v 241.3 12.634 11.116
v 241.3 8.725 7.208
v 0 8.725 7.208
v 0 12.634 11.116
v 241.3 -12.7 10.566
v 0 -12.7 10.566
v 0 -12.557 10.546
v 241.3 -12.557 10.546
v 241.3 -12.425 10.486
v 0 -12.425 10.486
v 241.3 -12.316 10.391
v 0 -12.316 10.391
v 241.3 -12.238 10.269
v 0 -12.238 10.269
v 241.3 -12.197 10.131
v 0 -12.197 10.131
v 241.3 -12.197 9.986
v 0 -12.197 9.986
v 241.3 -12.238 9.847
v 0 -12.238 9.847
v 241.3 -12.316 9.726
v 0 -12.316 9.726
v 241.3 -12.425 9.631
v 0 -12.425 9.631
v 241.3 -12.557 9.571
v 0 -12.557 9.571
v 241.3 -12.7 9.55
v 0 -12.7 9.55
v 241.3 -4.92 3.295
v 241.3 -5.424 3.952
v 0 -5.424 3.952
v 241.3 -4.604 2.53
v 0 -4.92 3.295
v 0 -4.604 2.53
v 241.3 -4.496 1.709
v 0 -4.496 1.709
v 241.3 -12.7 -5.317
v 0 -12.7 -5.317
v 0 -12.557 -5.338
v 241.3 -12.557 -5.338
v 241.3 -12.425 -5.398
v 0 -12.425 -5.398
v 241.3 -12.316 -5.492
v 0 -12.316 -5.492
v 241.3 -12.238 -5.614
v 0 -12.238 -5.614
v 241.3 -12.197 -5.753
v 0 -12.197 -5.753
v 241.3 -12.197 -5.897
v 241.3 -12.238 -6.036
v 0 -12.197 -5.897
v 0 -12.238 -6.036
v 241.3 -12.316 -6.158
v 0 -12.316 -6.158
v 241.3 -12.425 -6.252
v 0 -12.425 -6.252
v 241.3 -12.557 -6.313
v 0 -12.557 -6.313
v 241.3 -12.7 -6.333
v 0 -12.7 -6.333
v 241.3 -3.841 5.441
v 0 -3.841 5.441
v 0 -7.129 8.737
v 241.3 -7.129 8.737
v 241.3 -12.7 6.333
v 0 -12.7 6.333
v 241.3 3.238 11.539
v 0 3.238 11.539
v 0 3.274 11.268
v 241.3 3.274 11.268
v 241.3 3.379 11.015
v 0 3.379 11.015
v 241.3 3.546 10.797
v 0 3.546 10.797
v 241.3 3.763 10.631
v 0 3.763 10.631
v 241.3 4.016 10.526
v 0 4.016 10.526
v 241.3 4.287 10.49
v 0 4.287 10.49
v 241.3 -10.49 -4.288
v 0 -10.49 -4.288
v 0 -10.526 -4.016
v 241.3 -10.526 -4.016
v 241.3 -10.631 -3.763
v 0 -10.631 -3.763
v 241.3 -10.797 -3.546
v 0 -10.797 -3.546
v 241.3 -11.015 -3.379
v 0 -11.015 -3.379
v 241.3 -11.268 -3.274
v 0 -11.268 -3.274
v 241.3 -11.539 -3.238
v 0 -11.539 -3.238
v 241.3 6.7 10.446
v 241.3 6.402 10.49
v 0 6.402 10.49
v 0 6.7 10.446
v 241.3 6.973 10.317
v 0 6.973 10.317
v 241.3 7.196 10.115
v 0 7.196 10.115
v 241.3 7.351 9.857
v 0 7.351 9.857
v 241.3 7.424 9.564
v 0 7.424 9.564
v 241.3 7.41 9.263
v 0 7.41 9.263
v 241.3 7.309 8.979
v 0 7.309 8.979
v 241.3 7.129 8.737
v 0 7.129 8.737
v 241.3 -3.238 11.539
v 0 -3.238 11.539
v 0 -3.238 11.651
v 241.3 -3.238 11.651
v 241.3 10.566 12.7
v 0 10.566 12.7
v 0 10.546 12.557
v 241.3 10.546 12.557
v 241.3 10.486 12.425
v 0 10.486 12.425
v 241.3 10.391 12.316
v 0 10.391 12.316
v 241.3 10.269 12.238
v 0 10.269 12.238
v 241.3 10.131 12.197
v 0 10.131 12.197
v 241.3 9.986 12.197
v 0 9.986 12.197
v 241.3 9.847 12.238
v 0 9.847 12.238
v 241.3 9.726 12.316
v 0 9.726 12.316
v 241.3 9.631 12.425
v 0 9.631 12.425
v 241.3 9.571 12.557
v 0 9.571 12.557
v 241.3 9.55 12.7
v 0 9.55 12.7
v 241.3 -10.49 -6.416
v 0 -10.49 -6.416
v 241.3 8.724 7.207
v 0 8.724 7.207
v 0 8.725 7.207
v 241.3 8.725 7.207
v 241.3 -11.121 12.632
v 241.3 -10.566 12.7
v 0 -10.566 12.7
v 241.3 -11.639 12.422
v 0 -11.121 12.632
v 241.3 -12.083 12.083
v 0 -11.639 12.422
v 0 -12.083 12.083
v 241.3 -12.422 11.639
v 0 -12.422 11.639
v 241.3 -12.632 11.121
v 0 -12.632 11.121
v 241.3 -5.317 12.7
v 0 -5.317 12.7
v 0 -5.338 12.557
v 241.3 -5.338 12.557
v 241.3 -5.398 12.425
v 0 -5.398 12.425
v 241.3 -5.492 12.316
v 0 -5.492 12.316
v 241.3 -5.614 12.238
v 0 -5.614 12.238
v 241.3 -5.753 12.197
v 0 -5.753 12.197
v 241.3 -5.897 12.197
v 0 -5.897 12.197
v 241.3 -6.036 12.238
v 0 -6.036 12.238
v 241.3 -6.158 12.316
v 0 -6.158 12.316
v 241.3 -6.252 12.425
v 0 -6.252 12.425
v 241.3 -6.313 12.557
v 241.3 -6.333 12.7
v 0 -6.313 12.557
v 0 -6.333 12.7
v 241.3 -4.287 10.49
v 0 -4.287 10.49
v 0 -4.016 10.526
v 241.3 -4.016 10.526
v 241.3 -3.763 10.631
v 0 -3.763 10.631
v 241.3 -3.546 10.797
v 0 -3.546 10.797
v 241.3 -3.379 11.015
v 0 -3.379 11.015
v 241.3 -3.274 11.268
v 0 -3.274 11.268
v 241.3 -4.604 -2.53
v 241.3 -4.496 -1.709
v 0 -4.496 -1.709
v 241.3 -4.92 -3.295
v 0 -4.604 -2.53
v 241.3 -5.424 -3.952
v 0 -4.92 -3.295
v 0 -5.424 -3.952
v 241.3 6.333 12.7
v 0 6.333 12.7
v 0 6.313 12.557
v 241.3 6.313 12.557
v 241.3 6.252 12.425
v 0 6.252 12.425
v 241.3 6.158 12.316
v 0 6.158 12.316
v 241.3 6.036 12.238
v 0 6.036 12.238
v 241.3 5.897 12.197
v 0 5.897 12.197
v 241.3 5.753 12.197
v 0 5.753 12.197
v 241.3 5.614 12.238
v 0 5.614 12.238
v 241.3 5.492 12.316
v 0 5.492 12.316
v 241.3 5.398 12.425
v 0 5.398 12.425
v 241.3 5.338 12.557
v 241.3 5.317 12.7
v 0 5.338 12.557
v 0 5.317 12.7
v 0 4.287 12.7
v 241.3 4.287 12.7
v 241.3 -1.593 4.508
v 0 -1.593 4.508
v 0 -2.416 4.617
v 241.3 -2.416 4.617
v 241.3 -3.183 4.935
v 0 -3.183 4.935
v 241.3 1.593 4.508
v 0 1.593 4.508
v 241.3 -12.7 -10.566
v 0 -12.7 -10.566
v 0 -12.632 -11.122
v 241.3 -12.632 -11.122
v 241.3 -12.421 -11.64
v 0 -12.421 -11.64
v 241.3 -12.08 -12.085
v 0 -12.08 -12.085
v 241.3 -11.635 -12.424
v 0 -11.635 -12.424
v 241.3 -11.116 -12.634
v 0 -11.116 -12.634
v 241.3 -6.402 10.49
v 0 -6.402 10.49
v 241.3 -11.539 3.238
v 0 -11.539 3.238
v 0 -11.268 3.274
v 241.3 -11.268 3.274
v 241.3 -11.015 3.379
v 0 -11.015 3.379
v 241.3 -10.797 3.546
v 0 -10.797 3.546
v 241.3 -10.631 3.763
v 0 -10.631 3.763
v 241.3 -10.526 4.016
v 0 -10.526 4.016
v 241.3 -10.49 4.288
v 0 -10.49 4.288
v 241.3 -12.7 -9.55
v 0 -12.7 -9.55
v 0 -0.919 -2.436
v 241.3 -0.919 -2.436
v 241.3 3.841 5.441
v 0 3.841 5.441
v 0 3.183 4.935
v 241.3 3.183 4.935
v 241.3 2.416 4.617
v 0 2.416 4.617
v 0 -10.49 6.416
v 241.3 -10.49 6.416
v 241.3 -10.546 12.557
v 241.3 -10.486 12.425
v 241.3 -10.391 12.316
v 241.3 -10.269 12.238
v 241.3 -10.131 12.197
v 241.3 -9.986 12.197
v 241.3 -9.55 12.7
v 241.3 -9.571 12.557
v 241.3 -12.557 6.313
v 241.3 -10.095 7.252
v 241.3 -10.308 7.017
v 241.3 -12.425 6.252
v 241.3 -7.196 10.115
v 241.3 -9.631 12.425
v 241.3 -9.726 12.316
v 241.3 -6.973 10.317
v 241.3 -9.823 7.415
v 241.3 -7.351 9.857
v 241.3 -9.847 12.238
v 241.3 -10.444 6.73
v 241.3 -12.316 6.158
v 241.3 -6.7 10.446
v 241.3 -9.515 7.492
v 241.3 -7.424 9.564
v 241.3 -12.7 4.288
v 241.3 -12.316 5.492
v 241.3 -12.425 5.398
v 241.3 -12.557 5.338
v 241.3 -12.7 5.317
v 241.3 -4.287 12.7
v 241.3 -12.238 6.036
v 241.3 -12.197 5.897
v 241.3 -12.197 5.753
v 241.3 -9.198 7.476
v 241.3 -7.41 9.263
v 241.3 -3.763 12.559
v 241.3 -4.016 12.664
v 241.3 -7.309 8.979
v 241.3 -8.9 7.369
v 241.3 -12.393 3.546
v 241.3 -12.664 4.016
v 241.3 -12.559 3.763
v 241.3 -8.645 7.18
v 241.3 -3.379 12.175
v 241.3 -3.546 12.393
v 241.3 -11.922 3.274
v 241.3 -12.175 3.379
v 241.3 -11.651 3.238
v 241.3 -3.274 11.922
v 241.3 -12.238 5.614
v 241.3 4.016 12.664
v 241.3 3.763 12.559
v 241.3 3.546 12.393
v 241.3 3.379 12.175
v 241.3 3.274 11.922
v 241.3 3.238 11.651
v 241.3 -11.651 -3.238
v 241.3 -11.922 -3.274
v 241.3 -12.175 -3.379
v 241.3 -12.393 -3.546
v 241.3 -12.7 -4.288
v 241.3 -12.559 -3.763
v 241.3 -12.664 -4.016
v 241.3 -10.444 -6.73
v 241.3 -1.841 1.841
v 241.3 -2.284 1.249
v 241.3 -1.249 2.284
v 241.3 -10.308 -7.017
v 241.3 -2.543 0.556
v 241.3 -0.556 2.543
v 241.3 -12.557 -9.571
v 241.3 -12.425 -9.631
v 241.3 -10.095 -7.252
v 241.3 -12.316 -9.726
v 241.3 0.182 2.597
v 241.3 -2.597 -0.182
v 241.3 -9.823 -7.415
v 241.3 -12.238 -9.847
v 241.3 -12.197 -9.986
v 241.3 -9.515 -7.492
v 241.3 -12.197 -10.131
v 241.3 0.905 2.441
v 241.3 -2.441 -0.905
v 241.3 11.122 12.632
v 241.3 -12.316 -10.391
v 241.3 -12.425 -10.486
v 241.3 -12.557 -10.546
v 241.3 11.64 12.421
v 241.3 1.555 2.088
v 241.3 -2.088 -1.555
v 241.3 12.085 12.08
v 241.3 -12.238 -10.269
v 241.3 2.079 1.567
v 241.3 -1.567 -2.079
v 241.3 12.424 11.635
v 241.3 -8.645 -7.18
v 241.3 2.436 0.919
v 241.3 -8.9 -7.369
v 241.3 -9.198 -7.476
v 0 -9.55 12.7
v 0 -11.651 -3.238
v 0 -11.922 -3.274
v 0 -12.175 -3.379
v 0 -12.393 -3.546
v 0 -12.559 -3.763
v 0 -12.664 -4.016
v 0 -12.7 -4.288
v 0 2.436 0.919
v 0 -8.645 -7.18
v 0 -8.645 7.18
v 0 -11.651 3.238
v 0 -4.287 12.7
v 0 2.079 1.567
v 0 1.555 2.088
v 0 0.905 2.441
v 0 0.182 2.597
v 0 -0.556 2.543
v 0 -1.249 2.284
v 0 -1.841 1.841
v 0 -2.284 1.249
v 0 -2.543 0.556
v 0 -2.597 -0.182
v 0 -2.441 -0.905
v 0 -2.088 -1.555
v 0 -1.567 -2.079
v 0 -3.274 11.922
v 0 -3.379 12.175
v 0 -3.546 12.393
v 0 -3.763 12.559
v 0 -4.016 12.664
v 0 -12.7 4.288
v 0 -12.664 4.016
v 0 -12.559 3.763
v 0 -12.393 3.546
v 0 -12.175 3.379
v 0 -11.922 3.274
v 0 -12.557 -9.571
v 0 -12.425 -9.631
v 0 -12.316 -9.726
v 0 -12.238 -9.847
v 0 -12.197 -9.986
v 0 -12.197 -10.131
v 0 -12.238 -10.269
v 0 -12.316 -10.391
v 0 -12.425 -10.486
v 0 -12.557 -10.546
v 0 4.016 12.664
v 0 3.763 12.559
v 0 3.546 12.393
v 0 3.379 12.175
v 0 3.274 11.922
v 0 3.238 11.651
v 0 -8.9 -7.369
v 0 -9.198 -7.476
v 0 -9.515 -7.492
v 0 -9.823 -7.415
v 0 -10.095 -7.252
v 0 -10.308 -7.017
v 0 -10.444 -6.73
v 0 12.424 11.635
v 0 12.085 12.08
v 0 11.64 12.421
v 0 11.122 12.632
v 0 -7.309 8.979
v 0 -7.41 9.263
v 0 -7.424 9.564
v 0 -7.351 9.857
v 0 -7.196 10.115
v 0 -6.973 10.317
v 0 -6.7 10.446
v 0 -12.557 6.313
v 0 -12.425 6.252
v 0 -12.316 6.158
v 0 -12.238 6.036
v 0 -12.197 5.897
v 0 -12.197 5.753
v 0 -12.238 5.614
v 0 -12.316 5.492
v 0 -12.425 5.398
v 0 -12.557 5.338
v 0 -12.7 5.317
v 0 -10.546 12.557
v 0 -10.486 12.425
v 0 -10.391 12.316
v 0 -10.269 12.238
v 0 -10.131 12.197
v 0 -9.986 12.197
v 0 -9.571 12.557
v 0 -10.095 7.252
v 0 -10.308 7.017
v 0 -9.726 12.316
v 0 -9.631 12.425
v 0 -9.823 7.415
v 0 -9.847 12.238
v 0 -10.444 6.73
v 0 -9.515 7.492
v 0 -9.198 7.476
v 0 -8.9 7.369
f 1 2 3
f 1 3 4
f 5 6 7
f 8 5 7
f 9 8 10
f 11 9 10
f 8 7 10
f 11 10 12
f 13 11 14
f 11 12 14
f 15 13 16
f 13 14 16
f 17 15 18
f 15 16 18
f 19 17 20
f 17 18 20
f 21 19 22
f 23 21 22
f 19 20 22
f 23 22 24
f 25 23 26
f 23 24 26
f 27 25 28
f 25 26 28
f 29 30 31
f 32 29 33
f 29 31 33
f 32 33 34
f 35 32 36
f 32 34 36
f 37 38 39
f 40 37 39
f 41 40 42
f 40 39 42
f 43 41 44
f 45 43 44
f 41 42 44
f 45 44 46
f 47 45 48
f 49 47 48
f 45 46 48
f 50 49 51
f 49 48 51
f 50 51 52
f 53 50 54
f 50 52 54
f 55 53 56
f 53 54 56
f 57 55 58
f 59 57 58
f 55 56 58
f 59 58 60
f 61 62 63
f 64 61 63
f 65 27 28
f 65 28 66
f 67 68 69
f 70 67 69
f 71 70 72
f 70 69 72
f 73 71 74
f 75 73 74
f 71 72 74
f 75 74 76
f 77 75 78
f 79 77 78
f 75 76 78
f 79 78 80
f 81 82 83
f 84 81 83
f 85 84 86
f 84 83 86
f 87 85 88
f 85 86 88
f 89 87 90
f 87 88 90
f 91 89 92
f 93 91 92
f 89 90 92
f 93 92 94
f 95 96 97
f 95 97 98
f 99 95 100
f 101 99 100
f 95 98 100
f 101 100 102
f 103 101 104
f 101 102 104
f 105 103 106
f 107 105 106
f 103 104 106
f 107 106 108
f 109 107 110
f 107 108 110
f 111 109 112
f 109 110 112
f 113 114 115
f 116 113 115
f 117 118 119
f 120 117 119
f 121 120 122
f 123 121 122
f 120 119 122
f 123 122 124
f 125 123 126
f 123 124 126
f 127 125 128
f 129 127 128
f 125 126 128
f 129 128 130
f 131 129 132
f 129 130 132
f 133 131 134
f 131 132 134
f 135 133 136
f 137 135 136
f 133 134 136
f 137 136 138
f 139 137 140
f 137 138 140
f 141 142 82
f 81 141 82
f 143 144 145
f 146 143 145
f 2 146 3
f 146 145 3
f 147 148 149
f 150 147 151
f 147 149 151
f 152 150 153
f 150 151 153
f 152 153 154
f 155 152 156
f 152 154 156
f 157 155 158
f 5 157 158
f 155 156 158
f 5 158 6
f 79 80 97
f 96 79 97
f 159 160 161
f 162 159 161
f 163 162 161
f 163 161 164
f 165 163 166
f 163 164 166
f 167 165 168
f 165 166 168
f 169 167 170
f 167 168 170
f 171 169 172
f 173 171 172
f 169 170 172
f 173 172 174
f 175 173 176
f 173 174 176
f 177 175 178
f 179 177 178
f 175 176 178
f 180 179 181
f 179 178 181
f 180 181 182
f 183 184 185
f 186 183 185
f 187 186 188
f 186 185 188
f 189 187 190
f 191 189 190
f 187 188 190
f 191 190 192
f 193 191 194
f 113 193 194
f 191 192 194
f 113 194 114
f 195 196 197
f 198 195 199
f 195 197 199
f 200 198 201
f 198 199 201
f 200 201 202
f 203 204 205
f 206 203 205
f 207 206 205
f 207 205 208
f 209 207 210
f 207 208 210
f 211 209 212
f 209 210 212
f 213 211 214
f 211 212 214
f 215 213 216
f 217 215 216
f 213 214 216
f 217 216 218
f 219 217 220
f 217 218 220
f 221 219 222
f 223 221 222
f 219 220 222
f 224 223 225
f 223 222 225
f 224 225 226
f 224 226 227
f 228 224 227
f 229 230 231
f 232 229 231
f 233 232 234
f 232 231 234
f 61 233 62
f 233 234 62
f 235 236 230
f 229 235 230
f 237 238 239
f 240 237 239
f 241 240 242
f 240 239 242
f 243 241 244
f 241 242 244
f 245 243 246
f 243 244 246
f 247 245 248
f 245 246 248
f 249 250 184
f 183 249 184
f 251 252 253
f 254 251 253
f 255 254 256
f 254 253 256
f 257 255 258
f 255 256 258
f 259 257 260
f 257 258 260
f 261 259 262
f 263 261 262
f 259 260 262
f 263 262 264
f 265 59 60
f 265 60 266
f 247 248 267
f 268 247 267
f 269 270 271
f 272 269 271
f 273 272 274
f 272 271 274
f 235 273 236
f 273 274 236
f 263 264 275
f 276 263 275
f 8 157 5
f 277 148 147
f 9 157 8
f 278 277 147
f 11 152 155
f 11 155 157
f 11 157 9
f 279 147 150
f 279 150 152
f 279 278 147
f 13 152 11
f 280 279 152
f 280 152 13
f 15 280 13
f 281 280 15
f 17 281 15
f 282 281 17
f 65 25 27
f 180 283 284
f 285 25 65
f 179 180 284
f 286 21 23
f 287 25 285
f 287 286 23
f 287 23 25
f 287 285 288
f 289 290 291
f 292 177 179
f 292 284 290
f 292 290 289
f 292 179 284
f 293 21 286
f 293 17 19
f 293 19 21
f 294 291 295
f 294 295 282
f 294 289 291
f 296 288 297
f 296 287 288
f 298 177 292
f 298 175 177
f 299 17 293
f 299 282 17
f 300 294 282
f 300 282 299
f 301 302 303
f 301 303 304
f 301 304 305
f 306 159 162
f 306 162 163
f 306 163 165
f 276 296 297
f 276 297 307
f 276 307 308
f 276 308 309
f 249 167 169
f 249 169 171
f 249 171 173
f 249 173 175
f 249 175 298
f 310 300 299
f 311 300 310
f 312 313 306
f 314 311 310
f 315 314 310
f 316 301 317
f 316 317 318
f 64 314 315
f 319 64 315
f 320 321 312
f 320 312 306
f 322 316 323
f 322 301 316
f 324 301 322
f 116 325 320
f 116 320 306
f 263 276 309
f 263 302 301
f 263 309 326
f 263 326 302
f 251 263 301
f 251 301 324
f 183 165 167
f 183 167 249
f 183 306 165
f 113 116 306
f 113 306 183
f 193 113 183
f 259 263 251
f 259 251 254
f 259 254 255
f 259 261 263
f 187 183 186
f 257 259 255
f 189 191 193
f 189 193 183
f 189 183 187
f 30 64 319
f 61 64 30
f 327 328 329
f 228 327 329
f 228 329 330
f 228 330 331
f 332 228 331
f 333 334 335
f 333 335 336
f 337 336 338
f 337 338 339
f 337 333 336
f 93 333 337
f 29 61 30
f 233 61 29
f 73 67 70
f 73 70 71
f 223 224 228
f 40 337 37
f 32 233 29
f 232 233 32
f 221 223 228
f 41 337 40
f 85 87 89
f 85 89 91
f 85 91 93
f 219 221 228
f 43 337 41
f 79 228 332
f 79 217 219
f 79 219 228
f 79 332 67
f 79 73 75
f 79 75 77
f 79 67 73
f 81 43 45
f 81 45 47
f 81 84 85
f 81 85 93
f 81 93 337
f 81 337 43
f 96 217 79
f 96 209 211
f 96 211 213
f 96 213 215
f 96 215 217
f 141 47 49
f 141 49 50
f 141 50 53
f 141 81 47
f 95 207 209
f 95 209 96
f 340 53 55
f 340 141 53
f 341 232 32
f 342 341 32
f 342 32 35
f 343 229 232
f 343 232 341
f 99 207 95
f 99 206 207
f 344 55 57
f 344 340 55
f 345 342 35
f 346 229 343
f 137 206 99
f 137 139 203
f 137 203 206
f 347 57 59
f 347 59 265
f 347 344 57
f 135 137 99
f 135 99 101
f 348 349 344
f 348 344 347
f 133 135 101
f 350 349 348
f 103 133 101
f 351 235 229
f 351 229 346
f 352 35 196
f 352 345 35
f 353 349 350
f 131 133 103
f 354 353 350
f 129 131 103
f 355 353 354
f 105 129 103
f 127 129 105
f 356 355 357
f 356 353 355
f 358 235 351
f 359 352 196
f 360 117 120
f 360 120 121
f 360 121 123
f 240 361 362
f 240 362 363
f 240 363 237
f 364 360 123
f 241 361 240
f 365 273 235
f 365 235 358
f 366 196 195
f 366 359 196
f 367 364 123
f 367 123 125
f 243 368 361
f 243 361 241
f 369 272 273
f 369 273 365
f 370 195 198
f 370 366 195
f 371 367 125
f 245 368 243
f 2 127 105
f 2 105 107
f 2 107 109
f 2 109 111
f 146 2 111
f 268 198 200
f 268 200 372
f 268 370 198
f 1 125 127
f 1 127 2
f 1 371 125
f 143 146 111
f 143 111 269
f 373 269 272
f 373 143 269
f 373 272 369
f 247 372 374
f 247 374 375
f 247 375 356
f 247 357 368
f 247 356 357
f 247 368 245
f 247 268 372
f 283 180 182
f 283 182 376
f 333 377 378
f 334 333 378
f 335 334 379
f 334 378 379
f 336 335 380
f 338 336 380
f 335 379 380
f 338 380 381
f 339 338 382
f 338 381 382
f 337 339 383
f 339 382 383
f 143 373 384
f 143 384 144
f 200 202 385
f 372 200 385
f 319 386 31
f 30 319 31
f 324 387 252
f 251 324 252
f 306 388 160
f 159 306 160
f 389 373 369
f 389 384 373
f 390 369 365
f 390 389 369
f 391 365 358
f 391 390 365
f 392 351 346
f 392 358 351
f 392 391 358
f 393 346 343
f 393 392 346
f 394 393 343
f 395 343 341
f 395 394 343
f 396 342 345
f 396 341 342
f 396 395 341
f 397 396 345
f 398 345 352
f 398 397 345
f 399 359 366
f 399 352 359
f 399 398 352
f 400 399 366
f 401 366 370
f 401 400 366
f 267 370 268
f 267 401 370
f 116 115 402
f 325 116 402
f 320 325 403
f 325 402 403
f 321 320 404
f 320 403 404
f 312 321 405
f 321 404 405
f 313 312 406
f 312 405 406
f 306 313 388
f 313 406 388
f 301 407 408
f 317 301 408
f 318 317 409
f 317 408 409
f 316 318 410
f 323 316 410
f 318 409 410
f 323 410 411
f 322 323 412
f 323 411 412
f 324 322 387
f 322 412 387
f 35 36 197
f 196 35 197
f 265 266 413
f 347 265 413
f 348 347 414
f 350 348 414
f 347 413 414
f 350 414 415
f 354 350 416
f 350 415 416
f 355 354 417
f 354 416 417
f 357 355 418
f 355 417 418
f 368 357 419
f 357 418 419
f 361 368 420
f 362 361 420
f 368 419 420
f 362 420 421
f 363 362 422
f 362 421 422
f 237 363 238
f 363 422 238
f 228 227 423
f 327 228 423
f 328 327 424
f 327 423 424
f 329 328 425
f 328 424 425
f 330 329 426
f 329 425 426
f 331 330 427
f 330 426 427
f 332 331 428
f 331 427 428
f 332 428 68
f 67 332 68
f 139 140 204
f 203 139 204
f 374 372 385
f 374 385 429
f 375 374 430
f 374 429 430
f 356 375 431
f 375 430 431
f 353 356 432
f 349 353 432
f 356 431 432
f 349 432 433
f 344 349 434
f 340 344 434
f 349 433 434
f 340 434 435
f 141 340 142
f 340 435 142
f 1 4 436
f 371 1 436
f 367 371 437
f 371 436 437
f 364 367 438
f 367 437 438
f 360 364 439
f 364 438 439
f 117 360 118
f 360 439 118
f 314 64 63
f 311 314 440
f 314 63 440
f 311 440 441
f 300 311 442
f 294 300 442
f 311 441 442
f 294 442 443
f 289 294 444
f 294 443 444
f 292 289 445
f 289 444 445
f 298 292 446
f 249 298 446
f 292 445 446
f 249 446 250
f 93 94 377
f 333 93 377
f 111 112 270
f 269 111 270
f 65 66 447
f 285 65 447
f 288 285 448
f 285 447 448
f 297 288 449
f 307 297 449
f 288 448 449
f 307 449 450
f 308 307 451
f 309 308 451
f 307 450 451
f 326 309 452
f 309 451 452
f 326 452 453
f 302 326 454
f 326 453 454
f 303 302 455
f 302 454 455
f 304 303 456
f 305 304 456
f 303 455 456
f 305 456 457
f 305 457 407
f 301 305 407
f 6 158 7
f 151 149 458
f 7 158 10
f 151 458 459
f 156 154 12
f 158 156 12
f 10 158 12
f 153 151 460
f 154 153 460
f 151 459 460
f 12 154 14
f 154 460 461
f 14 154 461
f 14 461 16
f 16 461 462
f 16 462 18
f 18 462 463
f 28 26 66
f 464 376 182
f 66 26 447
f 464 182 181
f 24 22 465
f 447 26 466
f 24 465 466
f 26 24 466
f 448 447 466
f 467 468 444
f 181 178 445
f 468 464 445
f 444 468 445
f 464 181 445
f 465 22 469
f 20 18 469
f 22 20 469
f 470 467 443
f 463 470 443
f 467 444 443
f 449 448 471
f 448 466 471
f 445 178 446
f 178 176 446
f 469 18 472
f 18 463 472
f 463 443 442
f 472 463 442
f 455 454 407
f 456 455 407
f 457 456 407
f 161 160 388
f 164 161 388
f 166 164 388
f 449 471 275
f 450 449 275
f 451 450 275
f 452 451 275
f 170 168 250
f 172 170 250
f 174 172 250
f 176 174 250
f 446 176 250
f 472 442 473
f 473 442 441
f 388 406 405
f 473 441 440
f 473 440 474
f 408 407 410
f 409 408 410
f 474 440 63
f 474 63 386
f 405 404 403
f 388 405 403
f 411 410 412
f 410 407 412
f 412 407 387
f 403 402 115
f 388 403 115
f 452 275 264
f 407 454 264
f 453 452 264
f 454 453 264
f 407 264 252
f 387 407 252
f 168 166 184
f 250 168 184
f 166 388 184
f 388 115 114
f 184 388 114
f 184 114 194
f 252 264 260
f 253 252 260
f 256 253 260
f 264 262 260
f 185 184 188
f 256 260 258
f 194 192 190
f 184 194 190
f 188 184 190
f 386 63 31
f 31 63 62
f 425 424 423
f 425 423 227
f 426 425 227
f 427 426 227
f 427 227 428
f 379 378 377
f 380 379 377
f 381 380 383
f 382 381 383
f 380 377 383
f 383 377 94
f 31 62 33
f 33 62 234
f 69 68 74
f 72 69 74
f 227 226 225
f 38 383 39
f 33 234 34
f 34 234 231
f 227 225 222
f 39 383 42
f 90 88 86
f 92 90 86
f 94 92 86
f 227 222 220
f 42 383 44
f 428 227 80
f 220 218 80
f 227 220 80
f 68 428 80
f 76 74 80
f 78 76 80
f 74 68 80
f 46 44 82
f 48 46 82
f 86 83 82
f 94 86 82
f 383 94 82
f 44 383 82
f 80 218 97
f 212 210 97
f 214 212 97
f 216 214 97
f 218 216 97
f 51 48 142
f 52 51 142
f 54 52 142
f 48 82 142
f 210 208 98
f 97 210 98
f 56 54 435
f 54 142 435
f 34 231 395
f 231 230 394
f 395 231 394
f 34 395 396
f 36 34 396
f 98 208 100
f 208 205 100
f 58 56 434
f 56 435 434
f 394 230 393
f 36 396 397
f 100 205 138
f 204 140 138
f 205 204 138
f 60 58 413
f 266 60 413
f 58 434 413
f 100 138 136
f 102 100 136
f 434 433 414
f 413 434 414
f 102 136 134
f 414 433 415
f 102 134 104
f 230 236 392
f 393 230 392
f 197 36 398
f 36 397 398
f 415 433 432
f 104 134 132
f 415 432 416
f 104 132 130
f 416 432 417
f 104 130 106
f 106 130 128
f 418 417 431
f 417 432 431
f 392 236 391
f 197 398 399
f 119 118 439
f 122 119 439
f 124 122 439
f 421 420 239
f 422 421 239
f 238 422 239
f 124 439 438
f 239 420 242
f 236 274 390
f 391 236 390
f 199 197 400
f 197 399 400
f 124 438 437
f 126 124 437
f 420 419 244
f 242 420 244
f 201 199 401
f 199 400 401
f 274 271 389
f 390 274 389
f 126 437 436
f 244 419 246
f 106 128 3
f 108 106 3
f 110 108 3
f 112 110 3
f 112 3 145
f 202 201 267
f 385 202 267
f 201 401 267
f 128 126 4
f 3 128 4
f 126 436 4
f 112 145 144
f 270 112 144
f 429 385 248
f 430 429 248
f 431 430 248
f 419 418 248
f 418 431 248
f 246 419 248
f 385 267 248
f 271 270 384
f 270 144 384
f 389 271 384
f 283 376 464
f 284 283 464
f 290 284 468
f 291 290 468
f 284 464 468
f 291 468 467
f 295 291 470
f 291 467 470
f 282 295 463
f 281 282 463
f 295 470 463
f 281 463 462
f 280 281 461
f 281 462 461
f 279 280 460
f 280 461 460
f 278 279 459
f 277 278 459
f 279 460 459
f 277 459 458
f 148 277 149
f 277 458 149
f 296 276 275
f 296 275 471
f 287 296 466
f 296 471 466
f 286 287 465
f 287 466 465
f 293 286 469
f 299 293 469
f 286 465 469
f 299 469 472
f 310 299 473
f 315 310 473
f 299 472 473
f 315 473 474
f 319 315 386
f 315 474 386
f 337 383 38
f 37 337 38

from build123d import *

# Parameters (mm, degrees)
SKETCH1_R           = 2.6035
BOSS_EXTRUDE1_DEPTH = 241.3
CUT_EXTRUDE1_START  = -241.3
CUT_EXTRUDE1_DEPTH  = 241.3


# Read off the part's stored shape, not the designer's step: Cut-Extrude1
with BuildPart() as part:
    # Sketch1 → Boss-Extrude1 (new body)
    with BuildSketch(Plane(origin=(0, 0, 0), x_dir=(0, 0, -1), z_dir=(1, 0, 0))):
        with BuildLine():
            Line((6.333126718, -12.7), (9.550443118, -12.7))
            ThreePointArc((9.550443118, -12.7), (10.058366869, -12.192000006), (10.566443095, -12.699847501))
            ThreePointArc((10.566443095, -12.699847501), (12.082537762, -12.08250727), (12.699846982, -10.566399977))
            ThreePointArc((12.699846982, -10.566399977), (12.192000006, -10.058323491), (12.7, -9.5504))
            Line((12.7, -9.5504), (12.7, -6.3330836))
            ThreePointArc((12.7, -6.3330836), (12.192, -5.8250836), (12.7, -5.3170836))
            Line((12.7, -5.3170836), (12.7, -4.287469289))
            ThreePointArc((12.7, -4.287469289), (12.39275138, -3.545705502), (11.650987593, -3.238456882))
            Line((11.650987593, -3.238456882), (11.539212407, -3.238456882))
            ThreePointArc((11.539212407, -3.238456882), (10.79744862, -3.545705502), (10.4902, -4.287469289))
            Line((10.4902, -4.287469289), (10.4902, -6.402089023))
            ThreePointArc((10.4902, -6.402089023), (9.856505071, -7.351067942), (8.737131347, -7.129408934))
            Line((8.737131347, -7.129408934), (5.441005833, -3.840816462))
            ThreePointArc((5.441005833, -3.840816462), (4.750877967, -2.809883091), (4.5085, -1.593185507))
            Line((4.5085, -1.593185507), (4.5085, 1.593185507))
            ThreePointArc((4.5085, 1.593185507), (4.750877967, 2.809883091), (5.441005833, 3.840816462))
            Line((5.441005833, 3.840816462), (8.737131347, 7.129408934))
            ThreePointArc((8.737131347, 7.129408934), (9.856505071, 7.351067942), (10.4902, 6.402089023))
            Line((10.4902, 6.402089023), (10.4902, 4.287469289))
            ThreePointArc((10.4902, 4.287469289), (10.79744862, 3.545705502), (11.539212407, 3.238456882))
            Line((11.539212407, 3.238456882), (11.650987593, 3.238456882))
            ThreePointArc((11.650987593, 3.238456882), (12.39275138, 3.545705502), (12.7, 4.287469289))
            Line((12.7, 4.287469289), (12.7, 5.3170836))
            ThreePointArc((12.7, 5.3170836), (12.192, 5.8250836), (12.7, 6.3330836))
            Line((12.7, 6.3330836), (12.7, 9.5504))
            ThreePointArc((12.7, 9.5504), (12.192000006, 10.058323491), (12.699846982, 10.566399977))
            ThreePointArc((12.699846982, 10.566399977), (12.082537762, 12.08250727), (10.566443095, 12.699847501))
            ThreePointArc((10.566443095, 12.699847501), (10.058366869, 12.192000006), (9.550443118, 12.7))
            Line((9.550443118, 12.7), (6.333126718, 12.7))
            ThreePointArc((6.333126718, 12.7), (5.825126718, 12.192), (5.317126718, 12.7))
            Line((5.317126718, 12.7), (4.287512407, 12.7))
            ThreePointArc((4.287512407, 12.7), (3.54574862, 12.39275138), (3.2385, 11.650987593))
            Line((3.2385, 11.650987593), (3.2385, 11.539212407))
            ThreePointArc((3.2385, 11.539212407), (3.54574862, 10.79744862), (4.287512407, 10.4902))
            Line((4.287512407, 10.4902), (6.476788598, 10.4902))
            ThreePointArc((6.476788598, 10.4902), (7.432222385, 9.85140422), (7.207036008, 8.724370562))
            Line((7.207036008, 8.724370562), (3.898272566, 5.423169045))
            ThreePointArc((3.898272566, 5.423169045), (2.869120213, 4.736787962), (1.655778399, 4.4958))
            Line((1.655778399, 4.4958), (-1.655778399, 4.4958))
            ThreePointArc((-1.655778399, 4.4958), (-2.869120213, 4.736787962), (-3.898272566, 5.423169045))
            Line((-3.898272566, 5.423169045), (-7.207036008, 8.724370562))
            ThreePointArc((-7.207036008, 8.724370562), (-7.432222385, 9.85140422), (-6.476788598, 10.4902))
            Line((-6.476788598, 10.4902), (-4.287512407, 10.4902))
            ThreePointArc((-4.287512407, 10.4902), (-3.54574862, 10.79744862), (-3.2385, 11.539212407))
            Line((-3.2385, 11.539212407), (-3.2385, 11.650987593))
            ThreePointArc((-3.2385, 11.650987593), (-3.54574862, 12.39275138), (-4.287512407, 12.7))
            Line((-4.287512407, 12.7), (-5.317126718, 12.7))
            ThreePointArc((-5.317126718, 12.7), (-5.825126718, 12.192), (-6.333126718, 12.7))
            Line((-6.333126718, 12.7), (-9.550443118, 12.7))
            ThreePointArc((-9.550443118, 12.7), (-10.058366869, 12.192000006), (-10.566443095, 12.699847501))
            ThreePointArc((-10.566443095, 12.699847501), (-12.082537762, 12.08250727), (-12.699846982, 10.566399977))
            ThreePointArc((-12.699846982, 10.566399977), (-12.192000006, 10.058323491), (-12.7, 9.5504))
            Line((-12.7, 9.5504), (-12.7, 6.3330836))
            ThreePointArc((-12.7, 6.3330836), (-12.192, 5.8250836), (-12.7, 5.3170836))
            Line((-12.7, 5.3170836), (-12.7, 4.287469289))
            ThreePointArc((-12.7, 4.287469289), (-12.39275138, 3.545705502), (-11.650987593, 3.238456882))
            Line((-11.650987593, 3.238456882), (-11.539212407, 3.238456882))
            ThreePointArc((-11.539212407, 3.238456882), (-10.79744862, 3.545705502), (-10.4902, 4.287469289))
            Line((-10.4902, 4.287469289), (-10.4902, 6.402089023))
            ThreePointArc((-10.4902, 6.402089023), (-9.856505071, 7.351067942), (-8.737131347, 7.129408934))
            Line((-8.737131347, 7.129408934), (-5.441005833, 3.840816462))
            ThreePointArc((-5.441005833, 3.840816462), (-4.750877967, 2.809883091), (-4.5085, 1.593185507))
            Line((-4.5085, 1.593185507), (-4.5085, -1.593185507))
            ThreePointArc((-4.5085, -1.593185507), (-4.750877967, -2.809883091), (-5.441005833, -3.840816462))
            Line((-5.441005833, -3.840816462), (-8.737131347, -7.129408934))
            ThreePointArc((-8.737131347, -7.129408934), (-9.856505071, -7.351067942), (-10.4902, -6.402089023))
            Line((-10.4902, -6.402089023), (-10.4902, -4.287469289))
            ThreePointArc((-10.4902, -4.287469289), (-10.79744862, -3.545705502), (-11.539212407, -3.238456882))
            Line((-11.539212407, -3.238456882), (-11.650987593, -3.238456882))
            ThreePointArc((-11.650987593, -3.238456882), (-12.39275138, -3.545705502), (-12.7, -4.287469289))
            Line((-12.7, -4.287469289), (-12.7, -5.3170836))
            ThreePointArc((-12.7, -5.3170836), (-12.192, -5.8250836), (-12.7, -6.3330836))
            Line((-12.7, -6.3330836), (-12.7, -9.5504))
            ThreePointArc((-12.7, -9.5504), (-12.192000006, -10.058323491), (-12.699846982, -10.566399977))
            ThreePointArc((-12.699846982, -10.566399977), (-12.082537762, -12.08250727), (-10.566443095, -12.699847501))
            ThreePointArc((-10.566443095, -12.699847501), (-10.058366869, -12.192000006), (-9.550443118, -12.7))
            Line((-9.550443118, -12.7), (-6.333126718, -12.7))
            ThreePointArc((-6.333126718, -12.7), (-5.825126718, -12.192), (-5.317126718, -12.7))
            Line((-5.317126718, -12.7), (-4.287512407, -12.7))
            ThreePointArc((-4.287512407, -12.7), (-3.54574862, -12.39275138), (-3.2385, -11.650987593))
            Line((-3.2385, -11.650987593), (-3.2385, -11.539212407))
            ThreePointArc((-3.2385, -11.539212407), (-3.54574862, -10.79744862), (-4.287512407, -10.4902))
            Line((-4.287512407, -10.4902), (-6.416408329, -10.4902))
            ThreePointArc((-6.416408329, -10.4902), (-7.41473083, -9.822813117), (-7.179650497, -8.645192506))
            Line((-7.179650497, -8.645192506), (-3.952270251, -5.423690499))
            ThreePointArc((-3.952270251, -5.423690499), (-2.922936451, -4.736929036), (-1.709253557, -4.4958))
            Line((-1.709253557, -4.4958), (1.709253557, -4.4958))
            ThreePointArc((1.709253557, -4.4958), (2.922936451, -4.736929036), (3.952270251, -5.423690499))
            Line((3.952270251, -5.423690499), (7.179650497, -8.645192506))
            ThreePointArc((7.179650497, -8.645192506), (7.41473083, -9.822813117), (6.416408329, -10.4902))
            Line((6.416408329, -10.4902), (4.287512407, -10.4902))
            ThreePointArc((4.287512407, -10.4902), (3.54574862, -10.79744862), (3.2385, -11.539212407))
            Line((3.2385, -11.539212407), (3.2385, -11.650987593))
            ThreePointArc((3.2385, -11.650987593), (3.54574862, -12.39275138), (4.287512407, -12.7))
            Line((4.287512407, -12.7), (5.317126718, -12.7))
            ThreePointArc((5.317126718, -12.7), (5.825126718, -12.192), (6.333126718, -12.7))
        make_face()
        with Locations(Location((0, 0, 0), (0, 0, 180))):
            Circle(SKETCH1_R, mode=Mode.SUBTRACT)
    extrude(amount=BOSS_EXTRUDE1_DEPTH)

    # Cut-Extrude1 outline → Cut-Extrude1 (cut)
    with BuildSketch(Plane.ZY.offset(CUT_EXTRUDE1_START)):
        with BuildLine():
            ThreePointArc((-12.699846982, -10.566399977), (-12.684913132, -10.843563097), (-12.633696634, -11.11636208))
            Line((-12.633696634, -11.11636208), (-2.436025345, -0.918690791))
            ThreePointArc((-2.436025345, -0.918690791), (-1.840952505, 1.840952505), (0.918690791, 2.436025345))
            Line((0.918690791, 2.436025345), (7.207036008, 8.724370562))
            Line((7.207036008, 8.724370562), (3.898272566, 5.423169045))
            ThreePointArc((3.898272566, 5.423169045), (2.869120213, 4.736787962), (1.655778399, 4.4958))
            Line((1.655778399, 4.4958), (-1.655778399, 4.4958))
            ThreePointArc((-1.655778399, 4.4958), (-2.869120213, 4.736787962), (-3.898272566, 5.423169045))
            Line((-3.898272566, 5.423169045), (-7.207036008, 8.724370562))
            ThreePointArc((-7.207036008, 8.724370562), (-7.432222385, 9.85140422), (-6.476788598, 10.4902))
            Line((-6.476788598, 10.4902), (-4.287512407, 10.4902))
            ThreePointArc((-4.287512407, 10.4902), (-3.54574862, 10.79744862), (-3.2385, 11.539212407))
            Line((-3.2385, 11.539212407), (-3.2385, 11.650987593))
            ThreePointArc((-3.2385, 11.650987593), (-3.54574862, 12.39275138), (-4.287512407, 12.7))
            Line((-4.287512407, 12.7), (-5.317126718, 12.7))
            ThreePointArc((-5.317126718, 12.7), (-5.825126718, 12.192), (-6.333126718, 12.7))
            Line((-6.333126718, 12.7), (-9.550443118, 12.7))
            ThreePointArc((-9.550443118, 12.7), (-10.058366868, 12.192000006), (-10.566443095, 12.699847501))
            ThreePointArc((-10.566443095, 12.699847501), (-12.082537762, 12.08250727), (-12.699846982, 10.566399977))
            ThreePointArc((-12.699846982, 10.566399977), (-12.192000006, 10.058323491), (-12.7, 9.5504))
            Line((-12.7, 9.5504), (-12.7, 6.3330836))
            ThreePointArc((-12.7, 6.3330836), (-12.192, 5.8250836), (-12.7, 5.3170836))
            Line((-12.7, 5.3170836), (-12.7, 4.287469289))
            ThreePointArc((-12.7, 4.287469289), (-12.39275138, 3.545705502), (-11.650987593, 3.238456882))
            Line((-11.650987593, 3.238456882), (-11.539212407, 3.238456882))
            ThreePointArc((-11.539212407, 3.238456882), (-10.79744862, 3.545705502), (-10.4902, 4.287469289))
            Line((-10.4902, 4.287469289), (-10.4902, 6.402089023))
            ThreePointArc((-10.4902, 6.402089023), (-9.856505071, 7.351067942), (-8.737131347, 7.129408934))
            Line((-8.737131347, 7.129408934), (-5.441005833, 3.840816462))
            ThreePointArc((-5.441005833, 3.840816462), (-4.750877967, 2.80988309), (-4.5085, 1.593185507))
            Line((-4.5085, 1.593185507), (-4.5085, -1.593185507))
            ThreePointArc((-4.5085, -1.593185507), (-4.750877967, -2.80988309), (-5.441005833, -3.840816462))
            Line((-5.441005833, -3.840816462), (-8.737131347, -7.129408934))
            ThreePointArc((-8.737131347, -7.129408934), (-9.856505071, -7.351067942), (-10.4902, -6.402089023))
            Line((-10.4902, -6.402089023), (-10.4902, -4.287469289))
            ThreePointArc((-10.4902, -4.287469289), (-10.79744862, -3.545705502), (-11.539212407, -3.238456882))
            Line((-11.539212407, -3.238456882), (-11.650987593, -3.238456882))
            ThreePointArc((-11.650987593, -3.238456882), (-12.39275138, -3.545705502), (-12.7, -4.287469289))
            Line((-12.7, -4.287469289), (-12.7, -5.3170836))
            ThreePointArc((-12.7, -5.3170836), (-12.192, -5.8250836), (-12.7, -6.3330836))
            Line((-12.7, -6.3330836), (-12.7, -9.5504))
            ThreePointArc((-12.7, -9.5504), (-12.192000006, -10.058323491), (-12.699846982, -10.566399977))
        make_face()
        with BuildLine():
            ThreePointArc((6.476788598, 10.4902), (7.43199622, 9.851950672), (7.20787286, 8.725206458))
            Line((7.20787286, 8.725206458), (11.11636208, 12.633696634))
            ThreePointArc((11.11636208, 12.633696634), (10.843584503, 12.684910557), (10.566443095, 12.699847501))
            ThreePointArc((10.566443095, 12.699847501), (10.058366868, 12.192000006), (9.550443118, 12.7))
            Line((9.550443118, 12.7), (6.333126718, 12.7))
            ThreePointArc((6.333126718, 12.7), (5.825126718, 12.192), (5.317126718, 12.7))
            Line((5.317126718, 12.7), (4.287512407, 12.7))
            ThreePointArc((4.287512407, 12.7), (3.54574862, 12.39275138), (3.2385, 11.650987593))
            Line((3.2385, 11.650987593), (3.2385, 11.539212407))
            ThreePointArc((3.2385, 11.539212407), (3.54574862, 10.79744862), (4.287512407, 10.4902))
            Line((4.287512407, 10.4902), (6.476788598, 10.4902))
        make_face()
    extrude(amount=CUT_EXTRUDE1_DEPTH, mode=Mode.SUBTRACT)


solid = part.part
